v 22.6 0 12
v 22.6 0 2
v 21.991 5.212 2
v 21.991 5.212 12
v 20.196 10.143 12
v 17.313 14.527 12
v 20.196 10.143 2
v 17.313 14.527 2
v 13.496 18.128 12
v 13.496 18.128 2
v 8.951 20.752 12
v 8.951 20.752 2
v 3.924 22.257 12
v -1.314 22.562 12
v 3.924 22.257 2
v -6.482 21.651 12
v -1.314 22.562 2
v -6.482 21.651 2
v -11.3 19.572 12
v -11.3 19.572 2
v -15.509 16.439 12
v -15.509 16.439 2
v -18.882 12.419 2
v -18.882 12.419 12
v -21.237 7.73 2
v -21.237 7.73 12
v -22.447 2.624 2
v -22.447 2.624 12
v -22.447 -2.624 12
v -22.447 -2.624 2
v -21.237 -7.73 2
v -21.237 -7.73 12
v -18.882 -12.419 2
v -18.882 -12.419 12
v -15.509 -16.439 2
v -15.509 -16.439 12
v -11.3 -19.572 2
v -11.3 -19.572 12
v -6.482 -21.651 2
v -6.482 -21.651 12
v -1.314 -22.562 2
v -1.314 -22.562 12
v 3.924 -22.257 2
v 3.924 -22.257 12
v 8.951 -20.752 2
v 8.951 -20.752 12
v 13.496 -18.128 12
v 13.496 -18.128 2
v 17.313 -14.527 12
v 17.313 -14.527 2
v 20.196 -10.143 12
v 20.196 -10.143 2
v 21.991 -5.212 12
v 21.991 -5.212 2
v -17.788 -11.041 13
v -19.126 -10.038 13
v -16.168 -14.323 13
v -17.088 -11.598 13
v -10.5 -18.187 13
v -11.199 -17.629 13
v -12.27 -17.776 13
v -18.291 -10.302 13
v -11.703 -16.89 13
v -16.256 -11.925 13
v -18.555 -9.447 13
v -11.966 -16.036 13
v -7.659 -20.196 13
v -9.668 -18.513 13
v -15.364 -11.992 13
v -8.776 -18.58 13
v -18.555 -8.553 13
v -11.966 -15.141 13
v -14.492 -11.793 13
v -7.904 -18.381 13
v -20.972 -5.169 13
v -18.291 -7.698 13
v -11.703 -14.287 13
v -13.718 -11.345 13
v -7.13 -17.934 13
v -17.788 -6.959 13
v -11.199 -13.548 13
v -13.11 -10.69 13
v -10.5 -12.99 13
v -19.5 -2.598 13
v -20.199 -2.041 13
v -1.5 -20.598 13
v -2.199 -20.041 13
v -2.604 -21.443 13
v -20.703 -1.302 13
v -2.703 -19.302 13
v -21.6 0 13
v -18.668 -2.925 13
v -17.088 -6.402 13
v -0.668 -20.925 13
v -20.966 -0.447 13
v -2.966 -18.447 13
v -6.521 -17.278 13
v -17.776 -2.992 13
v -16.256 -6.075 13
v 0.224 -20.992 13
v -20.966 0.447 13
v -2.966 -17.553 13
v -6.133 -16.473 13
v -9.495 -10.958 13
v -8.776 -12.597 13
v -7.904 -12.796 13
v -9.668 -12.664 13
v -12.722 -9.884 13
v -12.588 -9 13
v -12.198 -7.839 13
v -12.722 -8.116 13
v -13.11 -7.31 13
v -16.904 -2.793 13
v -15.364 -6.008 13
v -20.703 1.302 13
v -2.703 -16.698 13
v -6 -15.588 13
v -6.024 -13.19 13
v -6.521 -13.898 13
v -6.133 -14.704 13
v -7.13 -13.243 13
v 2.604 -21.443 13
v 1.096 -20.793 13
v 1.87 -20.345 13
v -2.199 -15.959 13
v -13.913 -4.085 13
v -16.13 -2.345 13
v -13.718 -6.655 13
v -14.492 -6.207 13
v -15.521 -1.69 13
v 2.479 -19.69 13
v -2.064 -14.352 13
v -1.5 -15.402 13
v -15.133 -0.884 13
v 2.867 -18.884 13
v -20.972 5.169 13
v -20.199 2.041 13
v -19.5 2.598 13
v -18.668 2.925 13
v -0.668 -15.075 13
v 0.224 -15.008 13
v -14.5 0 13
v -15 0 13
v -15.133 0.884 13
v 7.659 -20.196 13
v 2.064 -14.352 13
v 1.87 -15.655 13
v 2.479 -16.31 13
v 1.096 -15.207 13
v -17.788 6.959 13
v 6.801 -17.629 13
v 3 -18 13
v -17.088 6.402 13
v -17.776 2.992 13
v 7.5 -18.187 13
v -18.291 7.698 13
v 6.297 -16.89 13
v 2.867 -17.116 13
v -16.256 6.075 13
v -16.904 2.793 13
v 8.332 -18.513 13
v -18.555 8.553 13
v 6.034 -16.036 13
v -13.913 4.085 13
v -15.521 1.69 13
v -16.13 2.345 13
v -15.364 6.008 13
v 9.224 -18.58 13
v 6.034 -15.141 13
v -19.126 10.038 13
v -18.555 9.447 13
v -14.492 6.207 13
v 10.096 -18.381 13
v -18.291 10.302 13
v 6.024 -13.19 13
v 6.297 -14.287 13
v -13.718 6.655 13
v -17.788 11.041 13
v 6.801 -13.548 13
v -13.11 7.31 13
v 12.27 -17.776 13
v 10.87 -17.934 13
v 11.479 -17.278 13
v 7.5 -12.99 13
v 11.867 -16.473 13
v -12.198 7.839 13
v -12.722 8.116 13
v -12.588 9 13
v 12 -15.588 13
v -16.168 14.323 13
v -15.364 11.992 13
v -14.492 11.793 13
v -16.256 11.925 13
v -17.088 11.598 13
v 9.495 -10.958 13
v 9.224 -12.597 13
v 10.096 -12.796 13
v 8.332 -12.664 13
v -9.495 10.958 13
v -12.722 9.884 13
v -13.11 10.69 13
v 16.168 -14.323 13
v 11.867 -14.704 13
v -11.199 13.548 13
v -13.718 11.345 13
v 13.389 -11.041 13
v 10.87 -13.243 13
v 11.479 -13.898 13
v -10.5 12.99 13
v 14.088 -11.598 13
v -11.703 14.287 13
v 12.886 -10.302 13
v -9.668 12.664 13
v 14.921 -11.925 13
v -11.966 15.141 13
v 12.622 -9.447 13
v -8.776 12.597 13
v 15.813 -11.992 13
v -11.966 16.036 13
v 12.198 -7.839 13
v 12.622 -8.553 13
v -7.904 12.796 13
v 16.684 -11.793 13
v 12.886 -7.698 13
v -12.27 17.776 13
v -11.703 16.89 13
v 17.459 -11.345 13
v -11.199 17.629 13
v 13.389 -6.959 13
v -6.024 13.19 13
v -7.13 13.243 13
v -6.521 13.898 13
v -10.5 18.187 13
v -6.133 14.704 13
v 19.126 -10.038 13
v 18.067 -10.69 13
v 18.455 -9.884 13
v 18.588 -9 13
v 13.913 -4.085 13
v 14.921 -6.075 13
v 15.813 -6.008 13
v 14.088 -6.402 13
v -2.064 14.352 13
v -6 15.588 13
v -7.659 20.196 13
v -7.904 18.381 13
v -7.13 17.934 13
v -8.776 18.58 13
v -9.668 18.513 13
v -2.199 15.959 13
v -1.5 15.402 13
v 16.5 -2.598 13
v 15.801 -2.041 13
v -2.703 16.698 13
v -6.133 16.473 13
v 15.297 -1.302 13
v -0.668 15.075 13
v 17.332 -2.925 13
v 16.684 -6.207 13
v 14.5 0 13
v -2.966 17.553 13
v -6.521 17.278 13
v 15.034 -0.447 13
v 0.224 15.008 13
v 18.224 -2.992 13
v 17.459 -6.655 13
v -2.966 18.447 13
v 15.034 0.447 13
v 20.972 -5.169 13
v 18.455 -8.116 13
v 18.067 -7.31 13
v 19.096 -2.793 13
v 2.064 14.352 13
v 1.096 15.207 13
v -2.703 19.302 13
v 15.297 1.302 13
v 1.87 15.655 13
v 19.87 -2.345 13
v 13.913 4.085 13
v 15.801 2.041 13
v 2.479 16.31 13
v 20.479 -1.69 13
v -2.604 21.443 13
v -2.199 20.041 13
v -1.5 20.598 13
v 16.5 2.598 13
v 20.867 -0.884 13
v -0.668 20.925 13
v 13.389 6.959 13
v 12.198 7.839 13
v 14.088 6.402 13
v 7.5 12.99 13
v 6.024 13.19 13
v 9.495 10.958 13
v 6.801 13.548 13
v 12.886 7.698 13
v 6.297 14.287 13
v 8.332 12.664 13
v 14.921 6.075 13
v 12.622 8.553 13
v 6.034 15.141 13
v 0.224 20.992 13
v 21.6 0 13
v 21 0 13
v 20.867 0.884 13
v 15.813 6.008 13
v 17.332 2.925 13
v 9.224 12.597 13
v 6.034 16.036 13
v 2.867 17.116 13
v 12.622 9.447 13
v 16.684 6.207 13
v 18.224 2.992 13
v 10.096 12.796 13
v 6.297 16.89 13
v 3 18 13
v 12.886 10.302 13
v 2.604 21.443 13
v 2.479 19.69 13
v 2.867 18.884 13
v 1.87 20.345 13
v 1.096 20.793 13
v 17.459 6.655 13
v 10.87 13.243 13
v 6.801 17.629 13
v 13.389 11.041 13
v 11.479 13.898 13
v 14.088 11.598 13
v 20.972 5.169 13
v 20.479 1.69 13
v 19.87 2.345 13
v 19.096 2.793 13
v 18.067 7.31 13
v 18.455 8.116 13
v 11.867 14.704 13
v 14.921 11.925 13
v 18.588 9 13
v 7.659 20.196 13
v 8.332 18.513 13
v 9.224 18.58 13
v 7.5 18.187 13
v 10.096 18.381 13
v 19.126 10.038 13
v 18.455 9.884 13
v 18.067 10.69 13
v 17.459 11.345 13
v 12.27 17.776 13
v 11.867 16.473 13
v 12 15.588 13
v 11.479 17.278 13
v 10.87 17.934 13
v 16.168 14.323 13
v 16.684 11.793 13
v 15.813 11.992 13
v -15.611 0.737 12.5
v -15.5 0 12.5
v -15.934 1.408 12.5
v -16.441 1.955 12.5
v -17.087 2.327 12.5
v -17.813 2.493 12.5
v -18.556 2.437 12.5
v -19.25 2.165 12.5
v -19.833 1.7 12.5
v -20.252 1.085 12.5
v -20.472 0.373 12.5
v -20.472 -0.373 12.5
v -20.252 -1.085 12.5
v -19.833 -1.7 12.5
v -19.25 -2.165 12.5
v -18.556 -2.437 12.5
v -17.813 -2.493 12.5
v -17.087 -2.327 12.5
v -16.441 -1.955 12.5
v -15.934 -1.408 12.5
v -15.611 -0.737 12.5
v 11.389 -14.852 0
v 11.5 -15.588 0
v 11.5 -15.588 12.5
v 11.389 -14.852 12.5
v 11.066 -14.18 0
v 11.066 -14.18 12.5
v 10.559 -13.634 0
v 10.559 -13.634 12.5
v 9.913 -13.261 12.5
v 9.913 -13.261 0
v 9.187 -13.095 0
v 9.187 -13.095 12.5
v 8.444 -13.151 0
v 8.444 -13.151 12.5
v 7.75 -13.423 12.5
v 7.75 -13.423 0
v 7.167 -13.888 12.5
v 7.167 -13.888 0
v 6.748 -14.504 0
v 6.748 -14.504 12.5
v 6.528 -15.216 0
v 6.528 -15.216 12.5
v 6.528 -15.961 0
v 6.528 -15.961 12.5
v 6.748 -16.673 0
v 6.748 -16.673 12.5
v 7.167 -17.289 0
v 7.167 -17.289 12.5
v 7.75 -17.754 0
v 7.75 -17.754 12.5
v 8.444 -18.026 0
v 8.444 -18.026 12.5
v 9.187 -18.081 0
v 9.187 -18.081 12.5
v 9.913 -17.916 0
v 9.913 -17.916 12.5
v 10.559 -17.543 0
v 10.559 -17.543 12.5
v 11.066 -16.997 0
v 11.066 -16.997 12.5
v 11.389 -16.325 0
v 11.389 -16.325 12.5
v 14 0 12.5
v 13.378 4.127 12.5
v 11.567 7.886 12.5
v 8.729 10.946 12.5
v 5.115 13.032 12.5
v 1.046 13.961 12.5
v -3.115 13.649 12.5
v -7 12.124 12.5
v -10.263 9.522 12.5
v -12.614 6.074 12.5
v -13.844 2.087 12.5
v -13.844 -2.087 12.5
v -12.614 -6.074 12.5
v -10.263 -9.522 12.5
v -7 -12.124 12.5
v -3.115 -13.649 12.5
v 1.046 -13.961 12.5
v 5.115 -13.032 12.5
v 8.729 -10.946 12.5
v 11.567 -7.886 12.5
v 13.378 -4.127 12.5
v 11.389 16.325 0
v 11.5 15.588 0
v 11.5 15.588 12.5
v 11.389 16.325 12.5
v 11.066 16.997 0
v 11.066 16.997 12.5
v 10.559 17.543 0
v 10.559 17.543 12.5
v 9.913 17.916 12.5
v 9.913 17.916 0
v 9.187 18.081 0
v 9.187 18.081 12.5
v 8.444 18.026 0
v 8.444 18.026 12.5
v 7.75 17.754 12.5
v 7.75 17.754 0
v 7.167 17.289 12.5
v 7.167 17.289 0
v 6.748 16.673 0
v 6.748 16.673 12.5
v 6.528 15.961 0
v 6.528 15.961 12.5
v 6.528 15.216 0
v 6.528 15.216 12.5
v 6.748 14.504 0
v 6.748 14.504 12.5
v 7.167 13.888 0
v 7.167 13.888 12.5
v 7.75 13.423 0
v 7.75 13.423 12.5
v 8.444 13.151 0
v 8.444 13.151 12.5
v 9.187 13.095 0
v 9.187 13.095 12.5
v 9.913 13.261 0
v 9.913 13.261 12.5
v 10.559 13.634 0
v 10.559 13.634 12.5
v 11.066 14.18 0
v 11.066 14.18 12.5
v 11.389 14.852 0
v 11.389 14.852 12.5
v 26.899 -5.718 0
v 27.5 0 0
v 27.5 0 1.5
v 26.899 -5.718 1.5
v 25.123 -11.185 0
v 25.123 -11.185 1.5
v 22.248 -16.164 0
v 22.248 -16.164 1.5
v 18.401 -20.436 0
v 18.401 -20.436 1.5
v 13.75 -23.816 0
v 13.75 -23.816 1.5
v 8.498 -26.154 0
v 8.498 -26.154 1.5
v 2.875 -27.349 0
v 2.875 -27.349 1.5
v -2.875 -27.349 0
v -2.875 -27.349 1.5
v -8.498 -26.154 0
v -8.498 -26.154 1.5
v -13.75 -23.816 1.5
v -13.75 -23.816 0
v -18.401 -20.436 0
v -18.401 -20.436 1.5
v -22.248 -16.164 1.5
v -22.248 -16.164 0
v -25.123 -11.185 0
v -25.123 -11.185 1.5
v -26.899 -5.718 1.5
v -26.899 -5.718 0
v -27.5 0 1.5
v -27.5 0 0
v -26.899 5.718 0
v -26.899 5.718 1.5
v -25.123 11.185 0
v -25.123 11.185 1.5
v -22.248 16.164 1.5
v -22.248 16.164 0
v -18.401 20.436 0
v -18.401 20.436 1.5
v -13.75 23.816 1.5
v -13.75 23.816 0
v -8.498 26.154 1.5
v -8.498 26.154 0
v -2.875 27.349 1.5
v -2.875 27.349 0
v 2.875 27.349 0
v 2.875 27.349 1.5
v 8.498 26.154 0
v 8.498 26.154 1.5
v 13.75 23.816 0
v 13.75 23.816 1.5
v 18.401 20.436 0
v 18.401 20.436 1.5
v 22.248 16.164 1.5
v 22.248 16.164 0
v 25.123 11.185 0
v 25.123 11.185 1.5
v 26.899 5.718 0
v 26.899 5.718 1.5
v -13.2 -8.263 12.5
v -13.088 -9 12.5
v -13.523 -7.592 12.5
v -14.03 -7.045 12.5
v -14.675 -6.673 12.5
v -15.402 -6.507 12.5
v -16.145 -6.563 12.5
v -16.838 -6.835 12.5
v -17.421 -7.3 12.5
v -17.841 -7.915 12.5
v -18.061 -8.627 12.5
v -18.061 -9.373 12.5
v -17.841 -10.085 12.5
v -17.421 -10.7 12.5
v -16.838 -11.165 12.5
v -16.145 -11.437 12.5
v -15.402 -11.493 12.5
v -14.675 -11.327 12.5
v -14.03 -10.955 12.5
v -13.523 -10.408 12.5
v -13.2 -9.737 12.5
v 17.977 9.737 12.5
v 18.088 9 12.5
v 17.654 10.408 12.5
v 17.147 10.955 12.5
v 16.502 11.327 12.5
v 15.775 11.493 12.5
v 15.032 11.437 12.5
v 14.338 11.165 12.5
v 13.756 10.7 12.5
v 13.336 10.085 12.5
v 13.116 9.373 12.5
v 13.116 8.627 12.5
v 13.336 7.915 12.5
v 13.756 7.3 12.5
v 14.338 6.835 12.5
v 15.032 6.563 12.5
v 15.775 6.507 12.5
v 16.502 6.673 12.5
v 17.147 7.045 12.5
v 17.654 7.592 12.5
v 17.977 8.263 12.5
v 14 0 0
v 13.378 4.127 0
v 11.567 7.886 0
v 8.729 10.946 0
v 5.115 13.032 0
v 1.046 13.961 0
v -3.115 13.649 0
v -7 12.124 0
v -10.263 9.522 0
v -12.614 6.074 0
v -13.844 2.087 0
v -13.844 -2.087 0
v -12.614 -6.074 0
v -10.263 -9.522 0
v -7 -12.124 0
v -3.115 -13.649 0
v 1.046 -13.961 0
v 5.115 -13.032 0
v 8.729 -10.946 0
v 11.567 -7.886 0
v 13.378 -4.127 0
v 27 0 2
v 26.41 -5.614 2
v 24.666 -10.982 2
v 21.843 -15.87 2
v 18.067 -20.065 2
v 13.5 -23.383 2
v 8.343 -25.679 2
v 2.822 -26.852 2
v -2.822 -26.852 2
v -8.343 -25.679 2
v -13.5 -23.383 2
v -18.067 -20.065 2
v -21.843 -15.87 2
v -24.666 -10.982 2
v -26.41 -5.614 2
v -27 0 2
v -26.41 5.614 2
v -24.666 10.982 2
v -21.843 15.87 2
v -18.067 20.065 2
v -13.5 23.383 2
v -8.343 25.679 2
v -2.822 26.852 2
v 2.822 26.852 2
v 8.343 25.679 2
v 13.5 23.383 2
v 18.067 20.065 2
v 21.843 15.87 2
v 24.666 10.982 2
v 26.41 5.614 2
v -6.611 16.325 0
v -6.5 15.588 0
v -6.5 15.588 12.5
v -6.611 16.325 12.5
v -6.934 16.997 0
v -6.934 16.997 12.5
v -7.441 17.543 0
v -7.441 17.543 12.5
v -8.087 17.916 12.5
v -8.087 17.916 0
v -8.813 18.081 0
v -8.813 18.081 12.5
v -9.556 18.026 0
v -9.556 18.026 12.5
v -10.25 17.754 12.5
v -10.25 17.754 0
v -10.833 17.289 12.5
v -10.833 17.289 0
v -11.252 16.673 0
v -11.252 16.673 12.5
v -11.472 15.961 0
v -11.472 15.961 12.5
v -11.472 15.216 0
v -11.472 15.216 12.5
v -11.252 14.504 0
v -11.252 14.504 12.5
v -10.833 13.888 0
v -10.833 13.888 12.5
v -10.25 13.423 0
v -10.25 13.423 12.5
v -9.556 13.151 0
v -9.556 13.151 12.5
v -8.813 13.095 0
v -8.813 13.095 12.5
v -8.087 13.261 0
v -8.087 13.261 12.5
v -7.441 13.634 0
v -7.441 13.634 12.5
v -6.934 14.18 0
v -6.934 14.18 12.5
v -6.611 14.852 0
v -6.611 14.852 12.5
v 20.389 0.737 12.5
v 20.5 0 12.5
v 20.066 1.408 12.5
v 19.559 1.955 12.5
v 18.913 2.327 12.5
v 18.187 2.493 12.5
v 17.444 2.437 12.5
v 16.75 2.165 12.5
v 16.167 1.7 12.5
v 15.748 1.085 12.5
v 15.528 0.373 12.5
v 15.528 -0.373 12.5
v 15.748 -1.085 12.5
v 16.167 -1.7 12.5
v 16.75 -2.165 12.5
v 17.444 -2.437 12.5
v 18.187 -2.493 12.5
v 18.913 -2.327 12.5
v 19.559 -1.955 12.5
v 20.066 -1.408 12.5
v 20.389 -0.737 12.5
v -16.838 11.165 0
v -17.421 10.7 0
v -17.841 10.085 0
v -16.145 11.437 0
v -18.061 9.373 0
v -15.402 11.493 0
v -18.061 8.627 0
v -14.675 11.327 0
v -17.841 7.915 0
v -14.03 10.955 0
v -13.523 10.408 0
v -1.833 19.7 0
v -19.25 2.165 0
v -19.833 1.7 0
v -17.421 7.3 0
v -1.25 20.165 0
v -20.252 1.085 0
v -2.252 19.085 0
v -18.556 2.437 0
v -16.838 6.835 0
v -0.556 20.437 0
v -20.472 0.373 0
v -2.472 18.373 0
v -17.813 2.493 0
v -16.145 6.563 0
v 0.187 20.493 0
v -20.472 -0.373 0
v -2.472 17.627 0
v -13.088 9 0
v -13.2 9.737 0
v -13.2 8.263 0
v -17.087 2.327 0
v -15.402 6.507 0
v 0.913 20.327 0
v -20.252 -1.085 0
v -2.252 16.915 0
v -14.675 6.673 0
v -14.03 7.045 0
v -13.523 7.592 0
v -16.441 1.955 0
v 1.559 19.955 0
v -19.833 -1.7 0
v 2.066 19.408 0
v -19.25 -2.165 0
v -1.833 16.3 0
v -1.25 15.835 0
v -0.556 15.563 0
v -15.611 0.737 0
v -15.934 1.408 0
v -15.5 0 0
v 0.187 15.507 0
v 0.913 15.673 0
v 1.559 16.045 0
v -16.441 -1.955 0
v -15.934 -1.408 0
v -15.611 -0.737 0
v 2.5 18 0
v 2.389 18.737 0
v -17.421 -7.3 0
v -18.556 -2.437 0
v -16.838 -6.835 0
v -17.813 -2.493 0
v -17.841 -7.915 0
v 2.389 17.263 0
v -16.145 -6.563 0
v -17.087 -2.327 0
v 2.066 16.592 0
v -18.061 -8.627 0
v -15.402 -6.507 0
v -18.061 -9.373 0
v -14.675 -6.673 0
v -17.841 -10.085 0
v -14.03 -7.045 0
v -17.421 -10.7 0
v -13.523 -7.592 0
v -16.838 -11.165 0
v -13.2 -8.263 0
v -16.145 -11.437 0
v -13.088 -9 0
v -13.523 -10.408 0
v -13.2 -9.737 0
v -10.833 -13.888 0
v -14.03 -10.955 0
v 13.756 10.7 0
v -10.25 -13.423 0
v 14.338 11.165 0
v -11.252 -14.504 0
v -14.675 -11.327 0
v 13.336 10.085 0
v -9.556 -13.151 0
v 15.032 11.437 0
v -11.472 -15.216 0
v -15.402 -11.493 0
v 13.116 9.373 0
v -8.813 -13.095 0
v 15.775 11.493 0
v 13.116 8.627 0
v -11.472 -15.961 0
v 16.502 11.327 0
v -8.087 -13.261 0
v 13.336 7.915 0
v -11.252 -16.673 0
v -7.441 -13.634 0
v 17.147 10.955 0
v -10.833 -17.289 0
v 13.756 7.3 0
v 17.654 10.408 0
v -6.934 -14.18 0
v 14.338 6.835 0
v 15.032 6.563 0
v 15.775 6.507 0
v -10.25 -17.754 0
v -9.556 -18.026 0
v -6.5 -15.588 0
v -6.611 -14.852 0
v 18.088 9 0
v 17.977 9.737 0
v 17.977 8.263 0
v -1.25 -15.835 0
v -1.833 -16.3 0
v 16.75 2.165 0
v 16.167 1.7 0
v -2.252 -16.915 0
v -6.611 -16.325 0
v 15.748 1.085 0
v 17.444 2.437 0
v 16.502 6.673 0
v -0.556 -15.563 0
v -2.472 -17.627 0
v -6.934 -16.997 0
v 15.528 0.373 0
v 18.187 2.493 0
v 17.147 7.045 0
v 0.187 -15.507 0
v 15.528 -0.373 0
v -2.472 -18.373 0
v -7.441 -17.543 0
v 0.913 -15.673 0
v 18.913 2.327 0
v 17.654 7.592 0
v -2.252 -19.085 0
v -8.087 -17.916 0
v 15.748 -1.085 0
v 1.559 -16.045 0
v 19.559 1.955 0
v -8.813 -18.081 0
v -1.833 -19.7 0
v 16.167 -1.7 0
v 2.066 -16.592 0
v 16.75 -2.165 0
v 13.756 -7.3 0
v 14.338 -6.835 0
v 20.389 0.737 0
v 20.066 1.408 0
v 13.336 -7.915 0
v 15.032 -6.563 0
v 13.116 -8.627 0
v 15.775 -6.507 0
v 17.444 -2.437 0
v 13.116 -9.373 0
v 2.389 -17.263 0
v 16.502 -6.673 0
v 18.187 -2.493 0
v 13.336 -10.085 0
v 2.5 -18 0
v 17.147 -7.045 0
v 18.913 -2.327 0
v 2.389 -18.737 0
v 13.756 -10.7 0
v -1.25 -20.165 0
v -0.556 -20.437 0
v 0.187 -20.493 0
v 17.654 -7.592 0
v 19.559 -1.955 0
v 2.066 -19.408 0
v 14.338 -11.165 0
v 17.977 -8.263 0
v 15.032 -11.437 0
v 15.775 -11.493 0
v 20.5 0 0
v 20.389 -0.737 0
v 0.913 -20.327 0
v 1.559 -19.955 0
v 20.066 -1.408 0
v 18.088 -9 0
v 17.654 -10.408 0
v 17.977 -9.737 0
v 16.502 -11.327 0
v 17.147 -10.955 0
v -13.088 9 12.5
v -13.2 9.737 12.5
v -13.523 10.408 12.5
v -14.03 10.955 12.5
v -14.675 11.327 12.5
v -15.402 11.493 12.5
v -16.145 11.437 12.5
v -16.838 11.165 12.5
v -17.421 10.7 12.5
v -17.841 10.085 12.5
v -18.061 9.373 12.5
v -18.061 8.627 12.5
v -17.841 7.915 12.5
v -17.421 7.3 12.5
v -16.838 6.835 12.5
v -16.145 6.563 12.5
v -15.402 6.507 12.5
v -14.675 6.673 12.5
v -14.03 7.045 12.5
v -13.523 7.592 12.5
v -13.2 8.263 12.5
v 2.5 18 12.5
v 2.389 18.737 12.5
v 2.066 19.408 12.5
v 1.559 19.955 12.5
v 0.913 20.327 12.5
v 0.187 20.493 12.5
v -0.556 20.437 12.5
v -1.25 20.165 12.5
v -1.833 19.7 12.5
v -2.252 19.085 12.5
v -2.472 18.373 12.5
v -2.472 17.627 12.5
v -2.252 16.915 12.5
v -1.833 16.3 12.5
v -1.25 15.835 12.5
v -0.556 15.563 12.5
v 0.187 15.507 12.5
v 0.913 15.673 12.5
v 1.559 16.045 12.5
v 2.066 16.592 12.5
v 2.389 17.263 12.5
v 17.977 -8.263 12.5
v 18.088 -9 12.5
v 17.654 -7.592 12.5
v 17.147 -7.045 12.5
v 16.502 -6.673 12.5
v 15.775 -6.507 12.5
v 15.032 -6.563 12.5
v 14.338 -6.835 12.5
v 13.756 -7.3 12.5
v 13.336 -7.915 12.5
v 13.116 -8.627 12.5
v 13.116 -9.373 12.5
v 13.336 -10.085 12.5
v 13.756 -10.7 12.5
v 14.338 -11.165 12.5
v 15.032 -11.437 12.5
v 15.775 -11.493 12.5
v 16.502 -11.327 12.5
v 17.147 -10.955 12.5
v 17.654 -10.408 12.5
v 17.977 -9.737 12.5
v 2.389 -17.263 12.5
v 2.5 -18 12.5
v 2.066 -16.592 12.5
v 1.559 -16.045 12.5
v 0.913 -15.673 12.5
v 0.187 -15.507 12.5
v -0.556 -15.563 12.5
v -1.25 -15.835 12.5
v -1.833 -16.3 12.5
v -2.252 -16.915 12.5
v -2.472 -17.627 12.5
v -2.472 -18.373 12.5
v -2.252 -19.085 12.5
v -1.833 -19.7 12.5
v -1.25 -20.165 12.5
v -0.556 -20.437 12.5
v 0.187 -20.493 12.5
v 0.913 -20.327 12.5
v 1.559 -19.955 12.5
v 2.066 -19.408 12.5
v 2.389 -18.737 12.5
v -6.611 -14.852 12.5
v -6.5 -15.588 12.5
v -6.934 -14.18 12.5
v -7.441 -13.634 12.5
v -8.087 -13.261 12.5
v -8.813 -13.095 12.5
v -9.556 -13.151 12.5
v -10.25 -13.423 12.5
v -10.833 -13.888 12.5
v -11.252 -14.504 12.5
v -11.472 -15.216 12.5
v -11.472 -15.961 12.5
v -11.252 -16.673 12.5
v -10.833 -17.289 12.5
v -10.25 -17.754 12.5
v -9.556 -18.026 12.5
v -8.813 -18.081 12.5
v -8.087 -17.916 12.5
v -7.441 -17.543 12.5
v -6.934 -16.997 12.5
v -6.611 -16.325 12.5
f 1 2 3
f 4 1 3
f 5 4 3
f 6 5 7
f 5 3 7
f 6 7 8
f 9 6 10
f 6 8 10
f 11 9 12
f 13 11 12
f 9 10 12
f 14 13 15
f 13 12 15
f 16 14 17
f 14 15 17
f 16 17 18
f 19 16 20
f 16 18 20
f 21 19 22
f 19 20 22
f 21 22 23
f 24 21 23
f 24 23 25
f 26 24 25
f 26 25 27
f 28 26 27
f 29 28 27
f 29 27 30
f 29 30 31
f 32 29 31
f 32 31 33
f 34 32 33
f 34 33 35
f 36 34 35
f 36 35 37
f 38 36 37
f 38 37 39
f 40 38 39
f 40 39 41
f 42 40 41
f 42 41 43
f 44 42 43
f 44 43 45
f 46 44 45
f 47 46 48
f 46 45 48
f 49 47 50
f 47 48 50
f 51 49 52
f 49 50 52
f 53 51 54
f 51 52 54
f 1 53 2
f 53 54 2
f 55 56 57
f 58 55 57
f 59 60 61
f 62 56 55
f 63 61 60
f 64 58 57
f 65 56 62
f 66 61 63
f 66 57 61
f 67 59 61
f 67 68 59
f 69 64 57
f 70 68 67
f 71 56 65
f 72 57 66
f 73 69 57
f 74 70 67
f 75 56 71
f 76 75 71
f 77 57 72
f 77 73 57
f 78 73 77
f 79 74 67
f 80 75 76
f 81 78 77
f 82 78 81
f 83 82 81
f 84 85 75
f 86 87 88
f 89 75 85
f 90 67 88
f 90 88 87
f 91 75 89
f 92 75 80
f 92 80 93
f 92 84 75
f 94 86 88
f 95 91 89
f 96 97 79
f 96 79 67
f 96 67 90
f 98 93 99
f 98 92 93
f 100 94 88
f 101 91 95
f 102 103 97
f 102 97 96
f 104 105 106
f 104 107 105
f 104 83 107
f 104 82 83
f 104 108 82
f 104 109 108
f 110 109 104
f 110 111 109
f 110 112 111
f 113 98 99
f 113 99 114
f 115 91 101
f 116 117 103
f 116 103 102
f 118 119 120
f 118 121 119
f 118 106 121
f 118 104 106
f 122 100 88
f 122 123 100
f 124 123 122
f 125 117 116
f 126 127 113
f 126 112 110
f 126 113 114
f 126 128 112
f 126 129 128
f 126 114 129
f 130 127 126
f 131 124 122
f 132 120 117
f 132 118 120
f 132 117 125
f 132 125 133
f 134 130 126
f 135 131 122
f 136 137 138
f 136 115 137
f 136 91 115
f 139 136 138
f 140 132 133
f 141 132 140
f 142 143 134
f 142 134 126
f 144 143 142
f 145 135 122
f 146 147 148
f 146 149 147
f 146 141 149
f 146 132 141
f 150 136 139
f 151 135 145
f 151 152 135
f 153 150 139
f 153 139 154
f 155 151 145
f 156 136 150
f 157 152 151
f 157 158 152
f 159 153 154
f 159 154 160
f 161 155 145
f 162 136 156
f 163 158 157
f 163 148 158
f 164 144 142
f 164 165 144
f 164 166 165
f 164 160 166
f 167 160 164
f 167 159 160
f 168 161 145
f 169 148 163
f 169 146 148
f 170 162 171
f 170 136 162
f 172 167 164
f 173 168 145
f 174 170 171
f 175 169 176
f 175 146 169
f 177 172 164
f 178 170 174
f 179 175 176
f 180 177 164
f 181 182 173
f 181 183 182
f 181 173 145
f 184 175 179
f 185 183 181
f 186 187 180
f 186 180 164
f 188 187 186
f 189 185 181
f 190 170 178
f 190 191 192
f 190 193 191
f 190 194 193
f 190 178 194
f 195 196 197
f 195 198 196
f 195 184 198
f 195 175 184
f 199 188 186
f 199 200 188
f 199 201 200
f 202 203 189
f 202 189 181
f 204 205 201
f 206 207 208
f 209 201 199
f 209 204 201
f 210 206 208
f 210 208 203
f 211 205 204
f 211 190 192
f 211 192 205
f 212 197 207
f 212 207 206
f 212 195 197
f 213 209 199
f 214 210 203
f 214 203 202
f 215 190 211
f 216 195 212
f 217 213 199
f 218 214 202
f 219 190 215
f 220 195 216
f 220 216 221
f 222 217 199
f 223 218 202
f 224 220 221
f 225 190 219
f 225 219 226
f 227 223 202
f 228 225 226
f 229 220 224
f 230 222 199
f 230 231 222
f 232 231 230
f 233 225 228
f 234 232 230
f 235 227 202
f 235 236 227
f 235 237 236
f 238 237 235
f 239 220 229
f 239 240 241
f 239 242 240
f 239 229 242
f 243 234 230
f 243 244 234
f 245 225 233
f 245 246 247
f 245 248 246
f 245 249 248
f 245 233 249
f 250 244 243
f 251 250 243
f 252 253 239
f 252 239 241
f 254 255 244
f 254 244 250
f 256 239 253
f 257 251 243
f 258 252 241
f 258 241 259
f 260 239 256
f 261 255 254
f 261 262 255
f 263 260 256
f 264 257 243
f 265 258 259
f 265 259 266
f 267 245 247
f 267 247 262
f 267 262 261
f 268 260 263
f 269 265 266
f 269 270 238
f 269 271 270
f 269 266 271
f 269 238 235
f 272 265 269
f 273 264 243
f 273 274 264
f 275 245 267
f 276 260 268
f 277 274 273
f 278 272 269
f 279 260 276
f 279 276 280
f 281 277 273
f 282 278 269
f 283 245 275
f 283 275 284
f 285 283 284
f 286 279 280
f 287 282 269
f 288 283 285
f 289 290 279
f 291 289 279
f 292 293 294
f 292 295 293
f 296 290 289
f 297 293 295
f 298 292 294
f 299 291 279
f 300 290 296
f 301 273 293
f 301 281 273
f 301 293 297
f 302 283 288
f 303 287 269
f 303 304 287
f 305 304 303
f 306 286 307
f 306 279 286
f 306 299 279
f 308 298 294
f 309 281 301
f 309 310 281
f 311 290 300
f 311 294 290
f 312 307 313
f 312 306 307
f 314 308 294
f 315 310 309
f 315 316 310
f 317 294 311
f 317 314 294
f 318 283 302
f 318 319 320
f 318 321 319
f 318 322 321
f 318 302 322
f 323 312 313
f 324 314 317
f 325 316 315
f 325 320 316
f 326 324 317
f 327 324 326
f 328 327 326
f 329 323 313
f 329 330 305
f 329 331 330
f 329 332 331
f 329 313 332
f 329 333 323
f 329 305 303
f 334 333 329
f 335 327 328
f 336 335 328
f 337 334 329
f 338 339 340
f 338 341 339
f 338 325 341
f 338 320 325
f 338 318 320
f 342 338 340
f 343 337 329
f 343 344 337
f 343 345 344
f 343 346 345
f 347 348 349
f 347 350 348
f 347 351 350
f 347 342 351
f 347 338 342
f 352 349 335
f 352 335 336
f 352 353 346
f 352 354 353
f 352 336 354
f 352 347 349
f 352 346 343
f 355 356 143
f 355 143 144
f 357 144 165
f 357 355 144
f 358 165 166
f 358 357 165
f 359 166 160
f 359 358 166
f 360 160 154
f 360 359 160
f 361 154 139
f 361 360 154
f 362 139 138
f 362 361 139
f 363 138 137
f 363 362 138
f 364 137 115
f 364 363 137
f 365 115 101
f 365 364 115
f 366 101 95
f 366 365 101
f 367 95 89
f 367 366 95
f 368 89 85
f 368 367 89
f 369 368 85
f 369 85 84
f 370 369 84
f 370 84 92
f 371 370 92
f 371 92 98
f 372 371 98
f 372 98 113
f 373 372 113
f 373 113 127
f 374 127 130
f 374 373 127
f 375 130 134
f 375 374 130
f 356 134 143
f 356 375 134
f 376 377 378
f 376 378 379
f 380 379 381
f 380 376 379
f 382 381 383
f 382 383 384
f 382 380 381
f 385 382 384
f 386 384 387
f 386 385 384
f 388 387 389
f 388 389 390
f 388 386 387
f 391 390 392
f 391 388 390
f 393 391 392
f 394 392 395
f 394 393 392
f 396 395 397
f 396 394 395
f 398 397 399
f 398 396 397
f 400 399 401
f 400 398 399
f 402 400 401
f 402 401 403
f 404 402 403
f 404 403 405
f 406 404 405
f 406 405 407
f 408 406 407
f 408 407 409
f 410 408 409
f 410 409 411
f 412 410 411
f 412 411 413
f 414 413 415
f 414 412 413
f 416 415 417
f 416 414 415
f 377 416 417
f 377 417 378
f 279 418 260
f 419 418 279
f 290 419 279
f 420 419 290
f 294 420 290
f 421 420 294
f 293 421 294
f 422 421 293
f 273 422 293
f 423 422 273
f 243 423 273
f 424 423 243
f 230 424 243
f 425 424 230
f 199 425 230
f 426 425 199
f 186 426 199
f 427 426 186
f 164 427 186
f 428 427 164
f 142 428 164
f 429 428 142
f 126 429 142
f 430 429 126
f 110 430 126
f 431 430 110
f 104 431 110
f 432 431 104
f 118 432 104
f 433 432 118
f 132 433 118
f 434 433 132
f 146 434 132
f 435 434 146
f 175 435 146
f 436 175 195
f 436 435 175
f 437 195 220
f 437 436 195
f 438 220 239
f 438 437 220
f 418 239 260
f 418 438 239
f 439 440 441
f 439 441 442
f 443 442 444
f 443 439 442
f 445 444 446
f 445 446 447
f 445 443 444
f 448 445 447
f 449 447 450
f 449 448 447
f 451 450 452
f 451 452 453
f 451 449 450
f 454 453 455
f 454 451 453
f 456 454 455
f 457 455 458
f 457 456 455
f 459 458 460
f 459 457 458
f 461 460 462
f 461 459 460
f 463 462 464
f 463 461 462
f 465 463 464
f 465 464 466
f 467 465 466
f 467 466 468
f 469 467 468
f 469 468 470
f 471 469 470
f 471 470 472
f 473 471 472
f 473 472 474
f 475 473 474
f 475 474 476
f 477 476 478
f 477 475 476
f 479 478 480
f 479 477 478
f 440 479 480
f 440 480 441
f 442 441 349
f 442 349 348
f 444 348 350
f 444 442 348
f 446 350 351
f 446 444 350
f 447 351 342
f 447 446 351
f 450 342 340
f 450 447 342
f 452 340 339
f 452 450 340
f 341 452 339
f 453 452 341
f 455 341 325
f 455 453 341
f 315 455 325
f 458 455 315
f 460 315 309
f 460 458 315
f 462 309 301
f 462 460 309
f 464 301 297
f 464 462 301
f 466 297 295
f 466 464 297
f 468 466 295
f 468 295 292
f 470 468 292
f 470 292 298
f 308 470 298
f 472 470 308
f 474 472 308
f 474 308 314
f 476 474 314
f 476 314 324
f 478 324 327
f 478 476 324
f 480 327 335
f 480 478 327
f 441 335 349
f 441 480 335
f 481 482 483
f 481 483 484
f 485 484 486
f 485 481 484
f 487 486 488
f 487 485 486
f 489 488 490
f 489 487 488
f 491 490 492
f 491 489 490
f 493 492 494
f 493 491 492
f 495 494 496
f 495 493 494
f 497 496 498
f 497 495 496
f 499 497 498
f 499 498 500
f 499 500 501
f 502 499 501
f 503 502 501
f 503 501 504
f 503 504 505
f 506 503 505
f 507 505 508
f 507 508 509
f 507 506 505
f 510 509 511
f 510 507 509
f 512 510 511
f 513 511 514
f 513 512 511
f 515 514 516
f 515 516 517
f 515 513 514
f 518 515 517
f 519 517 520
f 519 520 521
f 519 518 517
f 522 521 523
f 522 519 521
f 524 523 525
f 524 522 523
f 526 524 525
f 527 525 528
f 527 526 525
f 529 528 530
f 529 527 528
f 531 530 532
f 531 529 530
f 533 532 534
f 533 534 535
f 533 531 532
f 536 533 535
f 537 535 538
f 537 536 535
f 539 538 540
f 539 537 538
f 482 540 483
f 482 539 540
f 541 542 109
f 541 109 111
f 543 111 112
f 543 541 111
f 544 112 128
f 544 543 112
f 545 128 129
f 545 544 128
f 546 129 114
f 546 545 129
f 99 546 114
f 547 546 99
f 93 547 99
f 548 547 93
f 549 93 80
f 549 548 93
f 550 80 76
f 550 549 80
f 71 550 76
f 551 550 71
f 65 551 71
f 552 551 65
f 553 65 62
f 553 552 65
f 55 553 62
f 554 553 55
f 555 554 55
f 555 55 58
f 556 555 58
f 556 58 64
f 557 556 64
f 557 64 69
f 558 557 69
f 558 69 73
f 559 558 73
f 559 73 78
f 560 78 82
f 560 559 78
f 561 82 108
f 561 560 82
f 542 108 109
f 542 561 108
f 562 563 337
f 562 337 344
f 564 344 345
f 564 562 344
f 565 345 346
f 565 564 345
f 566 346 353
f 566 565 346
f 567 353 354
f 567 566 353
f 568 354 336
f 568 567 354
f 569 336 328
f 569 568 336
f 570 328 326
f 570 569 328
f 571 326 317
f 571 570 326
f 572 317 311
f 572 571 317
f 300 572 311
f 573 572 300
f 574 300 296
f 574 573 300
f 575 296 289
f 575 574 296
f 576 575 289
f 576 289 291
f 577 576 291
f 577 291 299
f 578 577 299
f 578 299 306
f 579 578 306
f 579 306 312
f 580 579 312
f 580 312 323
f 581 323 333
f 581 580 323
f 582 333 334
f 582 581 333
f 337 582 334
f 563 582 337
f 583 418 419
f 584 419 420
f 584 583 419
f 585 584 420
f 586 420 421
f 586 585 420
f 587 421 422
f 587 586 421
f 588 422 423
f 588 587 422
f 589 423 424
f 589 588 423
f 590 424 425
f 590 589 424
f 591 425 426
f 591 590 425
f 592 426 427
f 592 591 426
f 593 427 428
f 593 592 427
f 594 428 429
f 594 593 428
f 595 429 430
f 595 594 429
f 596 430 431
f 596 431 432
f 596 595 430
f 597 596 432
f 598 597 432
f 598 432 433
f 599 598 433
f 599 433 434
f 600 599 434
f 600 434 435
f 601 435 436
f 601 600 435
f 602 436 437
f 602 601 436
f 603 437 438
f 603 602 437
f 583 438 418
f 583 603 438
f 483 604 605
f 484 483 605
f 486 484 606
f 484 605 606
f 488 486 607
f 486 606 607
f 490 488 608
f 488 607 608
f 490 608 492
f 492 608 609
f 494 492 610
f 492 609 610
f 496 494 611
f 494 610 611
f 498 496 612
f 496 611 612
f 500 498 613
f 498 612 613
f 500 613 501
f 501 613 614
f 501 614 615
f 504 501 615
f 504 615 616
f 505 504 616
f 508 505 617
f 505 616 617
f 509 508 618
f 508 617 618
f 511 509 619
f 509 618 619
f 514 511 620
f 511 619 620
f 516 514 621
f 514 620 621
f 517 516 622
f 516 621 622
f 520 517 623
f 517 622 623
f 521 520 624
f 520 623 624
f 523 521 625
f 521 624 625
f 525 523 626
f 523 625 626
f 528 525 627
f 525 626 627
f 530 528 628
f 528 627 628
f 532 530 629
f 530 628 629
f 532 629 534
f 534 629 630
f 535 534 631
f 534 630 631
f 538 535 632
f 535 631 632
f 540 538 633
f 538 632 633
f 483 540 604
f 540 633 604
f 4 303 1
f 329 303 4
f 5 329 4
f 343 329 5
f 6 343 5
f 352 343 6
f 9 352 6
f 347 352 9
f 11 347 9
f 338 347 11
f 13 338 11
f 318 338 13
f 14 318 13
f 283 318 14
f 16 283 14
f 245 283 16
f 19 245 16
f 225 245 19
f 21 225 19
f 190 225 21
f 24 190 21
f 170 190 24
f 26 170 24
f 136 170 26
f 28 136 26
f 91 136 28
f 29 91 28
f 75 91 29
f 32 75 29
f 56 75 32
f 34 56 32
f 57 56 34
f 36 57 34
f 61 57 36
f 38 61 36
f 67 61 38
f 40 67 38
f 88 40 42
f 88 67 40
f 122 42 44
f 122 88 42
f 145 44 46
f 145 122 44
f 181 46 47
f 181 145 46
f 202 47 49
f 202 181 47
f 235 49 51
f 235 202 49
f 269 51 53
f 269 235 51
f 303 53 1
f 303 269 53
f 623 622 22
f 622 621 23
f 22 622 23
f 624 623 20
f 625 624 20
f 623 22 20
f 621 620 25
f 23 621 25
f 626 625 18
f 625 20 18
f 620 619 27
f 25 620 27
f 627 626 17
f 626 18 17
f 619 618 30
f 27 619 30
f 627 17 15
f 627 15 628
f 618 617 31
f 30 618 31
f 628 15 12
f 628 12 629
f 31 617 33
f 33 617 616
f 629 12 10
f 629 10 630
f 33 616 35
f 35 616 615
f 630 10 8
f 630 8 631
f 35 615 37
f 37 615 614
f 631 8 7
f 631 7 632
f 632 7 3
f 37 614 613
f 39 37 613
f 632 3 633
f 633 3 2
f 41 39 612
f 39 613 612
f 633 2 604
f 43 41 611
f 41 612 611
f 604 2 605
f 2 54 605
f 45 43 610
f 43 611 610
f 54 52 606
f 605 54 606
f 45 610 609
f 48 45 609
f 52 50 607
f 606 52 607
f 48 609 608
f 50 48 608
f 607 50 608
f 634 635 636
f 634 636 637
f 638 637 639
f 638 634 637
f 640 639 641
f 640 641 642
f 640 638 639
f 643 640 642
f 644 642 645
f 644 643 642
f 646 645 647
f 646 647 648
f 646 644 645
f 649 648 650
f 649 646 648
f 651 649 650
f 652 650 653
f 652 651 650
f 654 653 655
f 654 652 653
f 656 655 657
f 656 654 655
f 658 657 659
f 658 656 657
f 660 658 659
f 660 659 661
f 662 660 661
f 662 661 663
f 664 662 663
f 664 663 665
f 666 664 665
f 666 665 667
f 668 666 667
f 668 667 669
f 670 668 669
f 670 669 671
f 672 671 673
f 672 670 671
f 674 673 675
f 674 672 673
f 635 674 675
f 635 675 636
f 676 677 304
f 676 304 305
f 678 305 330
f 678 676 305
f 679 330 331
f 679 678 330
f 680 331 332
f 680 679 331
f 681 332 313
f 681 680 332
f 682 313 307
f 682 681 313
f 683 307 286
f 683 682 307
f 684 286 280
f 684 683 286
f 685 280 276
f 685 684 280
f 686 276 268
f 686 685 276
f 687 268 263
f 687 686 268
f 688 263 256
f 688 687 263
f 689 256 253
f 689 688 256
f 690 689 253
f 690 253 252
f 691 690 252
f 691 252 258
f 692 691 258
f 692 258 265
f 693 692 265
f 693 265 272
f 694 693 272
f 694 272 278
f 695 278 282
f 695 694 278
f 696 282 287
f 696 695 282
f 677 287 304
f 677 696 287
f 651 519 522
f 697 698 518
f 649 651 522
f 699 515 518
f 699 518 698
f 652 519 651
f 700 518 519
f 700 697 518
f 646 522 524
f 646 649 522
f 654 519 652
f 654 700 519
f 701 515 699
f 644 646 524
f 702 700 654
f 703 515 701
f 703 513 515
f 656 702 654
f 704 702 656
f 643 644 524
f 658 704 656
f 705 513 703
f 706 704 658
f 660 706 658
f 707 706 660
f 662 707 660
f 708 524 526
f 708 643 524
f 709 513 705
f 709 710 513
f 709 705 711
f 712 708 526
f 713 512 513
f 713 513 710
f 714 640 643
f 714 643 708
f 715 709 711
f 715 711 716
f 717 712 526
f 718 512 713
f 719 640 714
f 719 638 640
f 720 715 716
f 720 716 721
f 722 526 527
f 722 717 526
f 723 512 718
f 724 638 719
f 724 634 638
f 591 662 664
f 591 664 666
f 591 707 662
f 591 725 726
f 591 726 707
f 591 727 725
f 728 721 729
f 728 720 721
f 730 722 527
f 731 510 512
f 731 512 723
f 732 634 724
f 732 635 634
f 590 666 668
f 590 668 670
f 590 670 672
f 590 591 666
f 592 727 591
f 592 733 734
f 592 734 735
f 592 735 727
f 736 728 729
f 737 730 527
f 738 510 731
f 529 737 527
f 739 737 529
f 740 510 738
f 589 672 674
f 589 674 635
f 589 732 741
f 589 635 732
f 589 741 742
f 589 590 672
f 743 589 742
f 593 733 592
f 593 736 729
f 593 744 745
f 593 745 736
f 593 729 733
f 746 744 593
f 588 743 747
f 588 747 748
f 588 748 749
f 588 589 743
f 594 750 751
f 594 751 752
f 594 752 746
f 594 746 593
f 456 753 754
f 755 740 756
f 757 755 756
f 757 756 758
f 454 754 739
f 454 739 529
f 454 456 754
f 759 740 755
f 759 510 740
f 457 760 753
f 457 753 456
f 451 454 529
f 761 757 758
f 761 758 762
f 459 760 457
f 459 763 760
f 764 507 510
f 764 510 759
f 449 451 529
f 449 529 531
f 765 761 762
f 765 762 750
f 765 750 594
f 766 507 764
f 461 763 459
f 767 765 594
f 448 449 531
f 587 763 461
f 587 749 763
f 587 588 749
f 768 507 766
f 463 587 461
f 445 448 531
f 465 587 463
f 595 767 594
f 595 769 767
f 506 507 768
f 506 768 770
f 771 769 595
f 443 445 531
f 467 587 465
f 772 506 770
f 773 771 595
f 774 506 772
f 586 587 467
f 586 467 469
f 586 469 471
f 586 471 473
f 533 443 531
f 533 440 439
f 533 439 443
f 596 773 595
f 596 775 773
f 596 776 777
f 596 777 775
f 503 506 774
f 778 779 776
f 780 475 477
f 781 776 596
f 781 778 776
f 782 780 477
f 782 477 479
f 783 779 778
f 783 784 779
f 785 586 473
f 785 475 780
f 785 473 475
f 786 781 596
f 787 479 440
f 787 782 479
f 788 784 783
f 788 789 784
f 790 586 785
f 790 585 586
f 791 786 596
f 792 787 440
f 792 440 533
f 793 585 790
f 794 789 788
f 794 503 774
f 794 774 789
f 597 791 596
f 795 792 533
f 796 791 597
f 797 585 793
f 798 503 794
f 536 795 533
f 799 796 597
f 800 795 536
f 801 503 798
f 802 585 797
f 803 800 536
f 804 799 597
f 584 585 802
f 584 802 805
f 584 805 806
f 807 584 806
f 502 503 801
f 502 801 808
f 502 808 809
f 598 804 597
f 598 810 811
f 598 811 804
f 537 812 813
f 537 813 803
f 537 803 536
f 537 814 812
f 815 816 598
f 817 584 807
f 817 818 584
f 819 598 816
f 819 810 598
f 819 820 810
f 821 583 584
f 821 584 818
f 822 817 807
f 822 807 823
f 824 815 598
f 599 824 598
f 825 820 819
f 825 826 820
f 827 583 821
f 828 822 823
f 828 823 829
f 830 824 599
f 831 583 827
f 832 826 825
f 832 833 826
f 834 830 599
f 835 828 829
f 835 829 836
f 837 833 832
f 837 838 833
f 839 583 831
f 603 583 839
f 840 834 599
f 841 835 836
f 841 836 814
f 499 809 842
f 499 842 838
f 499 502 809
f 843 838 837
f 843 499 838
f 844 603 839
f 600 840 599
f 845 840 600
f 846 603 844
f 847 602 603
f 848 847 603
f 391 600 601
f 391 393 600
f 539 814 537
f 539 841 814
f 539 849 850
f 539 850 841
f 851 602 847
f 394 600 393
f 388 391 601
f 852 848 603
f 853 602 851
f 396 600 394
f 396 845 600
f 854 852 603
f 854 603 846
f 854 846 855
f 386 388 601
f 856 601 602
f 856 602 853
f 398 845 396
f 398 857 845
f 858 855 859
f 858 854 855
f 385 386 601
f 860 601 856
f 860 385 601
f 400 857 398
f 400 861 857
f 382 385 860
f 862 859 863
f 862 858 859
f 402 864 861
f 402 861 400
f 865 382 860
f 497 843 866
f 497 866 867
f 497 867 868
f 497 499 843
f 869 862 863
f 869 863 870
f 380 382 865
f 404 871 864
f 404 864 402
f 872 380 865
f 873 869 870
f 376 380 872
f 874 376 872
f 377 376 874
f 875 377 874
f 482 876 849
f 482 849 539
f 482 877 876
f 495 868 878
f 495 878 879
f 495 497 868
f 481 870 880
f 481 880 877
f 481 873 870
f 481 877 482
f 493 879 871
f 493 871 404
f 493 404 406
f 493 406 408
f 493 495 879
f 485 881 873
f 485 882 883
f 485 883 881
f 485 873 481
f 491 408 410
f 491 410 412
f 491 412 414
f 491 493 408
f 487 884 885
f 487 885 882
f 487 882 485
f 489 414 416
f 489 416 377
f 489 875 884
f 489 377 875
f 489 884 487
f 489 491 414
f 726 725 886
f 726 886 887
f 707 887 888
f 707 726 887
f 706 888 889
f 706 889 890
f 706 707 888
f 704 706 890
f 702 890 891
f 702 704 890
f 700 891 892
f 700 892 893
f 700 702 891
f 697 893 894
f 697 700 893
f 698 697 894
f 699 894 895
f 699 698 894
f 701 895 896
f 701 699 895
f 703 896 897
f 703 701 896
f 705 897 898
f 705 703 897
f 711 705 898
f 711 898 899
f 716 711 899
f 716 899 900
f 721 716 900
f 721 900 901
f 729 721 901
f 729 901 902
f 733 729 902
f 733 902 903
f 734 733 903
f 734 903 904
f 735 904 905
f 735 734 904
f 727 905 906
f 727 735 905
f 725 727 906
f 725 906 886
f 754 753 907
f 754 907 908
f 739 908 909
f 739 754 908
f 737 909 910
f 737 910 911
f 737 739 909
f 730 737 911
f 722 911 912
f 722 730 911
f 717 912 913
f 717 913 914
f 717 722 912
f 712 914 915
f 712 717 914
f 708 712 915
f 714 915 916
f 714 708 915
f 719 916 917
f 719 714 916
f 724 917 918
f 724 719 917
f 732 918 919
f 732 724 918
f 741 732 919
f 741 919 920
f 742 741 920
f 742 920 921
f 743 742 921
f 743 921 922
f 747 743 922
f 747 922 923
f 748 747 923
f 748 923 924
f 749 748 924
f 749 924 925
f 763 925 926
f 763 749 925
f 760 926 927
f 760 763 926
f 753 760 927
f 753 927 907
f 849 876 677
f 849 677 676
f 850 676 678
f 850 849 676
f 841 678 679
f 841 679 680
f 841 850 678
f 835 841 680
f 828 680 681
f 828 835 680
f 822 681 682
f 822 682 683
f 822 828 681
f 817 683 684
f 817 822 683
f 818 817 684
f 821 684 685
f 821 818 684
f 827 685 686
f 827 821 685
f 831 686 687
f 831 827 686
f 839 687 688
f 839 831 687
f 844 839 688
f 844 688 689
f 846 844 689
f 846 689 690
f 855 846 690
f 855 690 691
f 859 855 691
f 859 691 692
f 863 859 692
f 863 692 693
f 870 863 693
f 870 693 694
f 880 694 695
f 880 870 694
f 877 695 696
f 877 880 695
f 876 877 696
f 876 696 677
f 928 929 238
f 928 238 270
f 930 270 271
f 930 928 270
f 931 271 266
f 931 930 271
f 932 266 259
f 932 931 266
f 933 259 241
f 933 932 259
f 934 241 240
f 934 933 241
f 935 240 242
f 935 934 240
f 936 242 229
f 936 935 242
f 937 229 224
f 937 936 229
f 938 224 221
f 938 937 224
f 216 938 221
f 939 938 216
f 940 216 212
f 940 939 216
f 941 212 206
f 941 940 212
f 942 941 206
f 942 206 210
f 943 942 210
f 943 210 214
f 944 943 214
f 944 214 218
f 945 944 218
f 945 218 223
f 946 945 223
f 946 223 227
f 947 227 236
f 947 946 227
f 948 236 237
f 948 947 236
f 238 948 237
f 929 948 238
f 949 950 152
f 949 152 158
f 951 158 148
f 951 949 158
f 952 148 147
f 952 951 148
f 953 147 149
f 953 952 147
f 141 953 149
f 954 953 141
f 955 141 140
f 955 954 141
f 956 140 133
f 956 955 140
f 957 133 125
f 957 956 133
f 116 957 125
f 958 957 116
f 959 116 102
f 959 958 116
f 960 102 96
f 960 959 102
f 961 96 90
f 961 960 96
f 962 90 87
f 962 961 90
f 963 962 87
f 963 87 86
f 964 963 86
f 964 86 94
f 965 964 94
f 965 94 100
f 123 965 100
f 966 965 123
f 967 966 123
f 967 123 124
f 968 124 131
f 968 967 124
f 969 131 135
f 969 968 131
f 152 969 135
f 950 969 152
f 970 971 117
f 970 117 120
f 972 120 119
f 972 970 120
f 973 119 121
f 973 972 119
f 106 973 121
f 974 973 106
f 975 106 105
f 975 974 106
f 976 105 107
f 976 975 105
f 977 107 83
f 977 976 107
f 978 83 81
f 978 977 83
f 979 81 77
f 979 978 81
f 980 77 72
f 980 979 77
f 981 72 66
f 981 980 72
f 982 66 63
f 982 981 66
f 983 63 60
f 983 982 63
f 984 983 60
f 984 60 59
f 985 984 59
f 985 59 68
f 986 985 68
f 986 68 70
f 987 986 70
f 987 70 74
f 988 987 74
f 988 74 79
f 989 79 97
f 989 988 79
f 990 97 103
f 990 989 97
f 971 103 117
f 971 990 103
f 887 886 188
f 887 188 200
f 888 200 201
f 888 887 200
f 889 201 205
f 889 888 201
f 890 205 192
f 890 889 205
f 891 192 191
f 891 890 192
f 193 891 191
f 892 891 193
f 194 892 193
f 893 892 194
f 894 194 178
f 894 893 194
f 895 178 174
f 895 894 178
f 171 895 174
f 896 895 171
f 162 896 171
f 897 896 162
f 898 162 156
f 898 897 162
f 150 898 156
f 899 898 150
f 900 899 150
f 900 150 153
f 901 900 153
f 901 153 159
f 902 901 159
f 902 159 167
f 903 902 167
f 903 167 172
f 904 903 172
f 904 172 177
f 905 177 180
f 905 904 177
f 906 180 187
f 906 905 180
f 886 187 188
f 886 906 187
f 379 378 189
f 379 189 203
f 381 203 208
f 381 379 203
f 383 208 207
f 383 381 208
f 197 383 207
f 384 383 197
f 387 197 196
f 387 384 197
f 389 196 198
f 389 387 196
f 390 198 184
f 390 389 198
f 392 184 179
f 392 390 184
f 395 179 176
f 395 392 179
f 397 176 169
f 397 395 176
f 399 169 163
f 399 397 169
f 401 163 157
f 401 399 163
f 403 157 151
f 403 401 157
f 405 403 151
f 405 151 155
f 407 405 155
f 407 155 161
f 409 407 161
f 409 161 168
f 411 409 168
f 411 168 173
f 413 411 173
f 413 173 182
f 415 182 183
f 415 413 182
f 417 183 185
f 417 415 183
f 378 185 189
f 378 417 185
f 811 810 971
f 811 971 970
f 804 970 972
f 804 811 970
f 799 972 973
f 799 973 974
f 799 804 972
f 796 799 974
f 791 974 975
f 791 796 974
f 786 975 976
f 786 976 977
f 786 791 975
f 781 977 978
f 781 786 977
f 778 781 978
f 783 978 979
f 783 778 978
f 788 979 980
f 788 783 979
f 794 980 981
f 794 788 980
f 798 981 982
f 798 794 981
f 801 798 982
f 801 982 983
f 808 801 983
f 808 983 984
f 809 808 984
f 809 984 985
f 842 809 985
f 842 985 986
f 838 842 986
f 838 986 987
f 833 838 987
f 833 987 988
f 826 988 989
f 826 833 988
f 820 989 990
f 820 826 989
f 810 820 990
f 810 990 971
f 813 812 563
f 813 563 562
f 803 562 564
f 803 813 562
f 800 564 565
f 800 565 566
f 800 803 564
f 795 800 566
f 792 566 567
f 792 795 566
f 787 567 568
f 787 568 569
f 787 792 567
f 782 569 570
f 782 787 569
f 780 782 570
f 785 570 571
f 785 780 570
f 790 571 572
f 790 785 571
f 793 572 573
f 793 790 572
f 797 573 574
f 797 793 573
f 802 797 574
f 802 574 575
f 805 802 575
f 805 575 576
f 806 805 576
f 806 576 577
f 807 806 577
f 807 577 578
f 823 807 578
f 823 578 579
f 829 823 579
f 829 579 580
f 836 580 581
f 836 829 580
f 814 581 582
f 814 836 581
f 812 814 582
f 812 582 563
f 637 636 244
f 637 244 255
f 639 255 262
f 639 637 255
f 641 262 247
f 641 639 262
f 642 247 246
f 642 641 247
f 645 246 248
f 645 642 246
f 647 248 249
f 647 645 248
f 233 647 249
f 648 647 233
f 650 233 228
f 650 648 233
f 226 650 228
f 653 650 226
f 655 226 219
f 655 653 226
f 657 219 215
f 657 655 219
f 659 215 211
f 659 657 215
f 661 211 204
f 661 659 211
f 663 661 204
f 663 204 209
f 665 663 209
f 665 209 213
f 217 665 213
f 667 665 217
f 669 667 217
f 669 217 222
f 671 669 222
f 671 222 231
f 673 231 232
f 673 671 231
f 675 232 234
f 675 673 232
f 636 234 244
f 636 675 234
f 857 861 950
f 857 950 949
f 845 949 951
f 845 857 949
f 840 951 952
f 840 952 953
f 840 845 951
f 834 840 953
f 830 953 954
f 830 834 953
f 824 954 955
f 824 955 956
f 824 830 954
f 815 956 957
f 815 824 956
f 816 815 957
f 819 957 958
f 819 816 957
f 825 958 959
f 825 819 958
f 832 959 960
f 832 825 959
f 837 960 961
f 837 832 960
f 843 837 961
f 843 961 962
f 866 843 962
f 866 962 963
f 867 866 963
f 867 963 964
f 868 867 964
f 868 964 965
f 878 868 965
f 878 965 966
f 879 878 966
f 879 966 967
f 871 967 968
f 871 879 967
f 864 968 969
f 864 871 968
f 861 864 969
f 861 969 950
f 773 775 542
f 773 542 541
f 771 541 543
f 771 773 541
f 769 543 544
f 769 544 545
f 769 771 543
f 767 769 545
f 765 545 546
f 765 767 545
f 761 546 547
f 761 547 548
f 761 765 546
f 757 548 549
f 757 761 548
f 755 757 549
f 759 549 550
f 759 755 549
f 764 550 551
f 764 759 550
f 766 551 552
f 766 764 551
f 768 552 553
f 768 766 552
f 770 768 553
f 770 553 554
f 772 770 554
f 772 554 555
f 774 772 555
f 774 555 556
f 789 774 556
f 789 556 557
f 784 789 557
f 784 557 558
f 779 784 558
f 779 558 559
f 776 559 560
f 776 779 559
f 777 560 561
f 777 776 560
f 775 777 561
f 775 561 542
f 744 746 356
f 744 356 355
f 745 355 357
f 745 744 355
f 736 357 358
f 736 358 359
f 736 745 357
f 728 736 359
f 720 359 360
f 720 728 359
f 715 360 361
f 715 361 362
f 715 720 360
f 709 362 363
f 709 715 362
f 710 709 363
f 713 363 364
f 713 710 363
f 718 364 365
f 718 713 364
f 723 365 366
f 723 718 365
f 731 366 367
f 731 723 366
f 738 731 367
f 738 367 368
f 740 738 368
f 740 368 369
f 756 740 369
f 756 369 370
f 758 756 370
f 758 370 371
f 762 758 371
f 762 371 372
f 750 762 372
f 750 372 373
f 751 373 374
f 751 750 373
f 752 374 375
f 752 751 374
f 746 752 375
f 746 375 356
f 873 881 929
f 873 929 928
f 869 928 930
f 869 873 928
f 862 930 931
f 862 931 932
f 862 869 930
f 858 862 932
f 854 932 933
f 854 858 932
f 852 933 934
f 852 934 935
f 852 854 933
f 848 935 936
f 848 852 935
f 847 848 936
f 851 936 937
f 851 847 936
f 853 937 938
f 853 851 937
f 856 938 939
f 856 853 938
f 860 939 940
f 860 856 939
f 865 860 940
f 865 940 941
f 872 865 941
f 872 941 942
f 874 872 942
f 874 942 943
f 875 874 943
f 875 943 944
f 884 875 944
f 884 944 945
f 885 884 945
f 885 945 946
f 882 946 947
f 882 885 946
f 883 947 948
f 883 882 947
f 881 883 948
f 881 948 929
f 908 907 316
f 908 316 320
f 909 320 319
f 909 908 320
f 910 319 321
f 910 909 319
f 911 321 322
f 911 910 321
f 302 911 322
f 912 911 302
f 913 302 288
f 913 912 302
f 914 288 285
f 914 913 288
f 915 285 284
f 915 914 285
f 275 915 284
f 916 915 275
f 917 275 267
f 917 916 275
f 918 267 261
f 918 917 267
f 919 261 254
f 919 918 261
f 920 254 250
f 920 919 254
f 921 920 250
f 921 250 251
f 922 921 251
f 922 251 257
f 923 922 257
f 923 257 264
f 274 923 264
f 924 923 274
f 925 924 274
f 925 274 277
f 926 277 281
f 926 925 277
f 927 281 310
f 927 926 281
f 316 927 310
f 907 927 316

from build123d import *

# Parameters (mm, degrees)
SKETCH_R        = 22.6
SKETCH_R_2      = 14
SKETCH_R_3      = 2.5
PAD_DEPTH       = 13
SKETCH001_R     = 27.5
SKETCH001_R_2   = 22.5
PAD001_DEPTH    = 2
CHAMFER_SIZE    = 0.5
CHAMFER001_SIZE = 1
CHAMFER002_SIZE = 0.5
CHAMFER003_SIZE = 0.5


with BuildPart() as part:
    # Sketch → Pad (new body)
    with BuildSketch(Plane.XY):
        Circle(SKETCH_R)
        Circle(SKETCH_R_2, mode=Mode.SUBTRACT)
        with Locations((0, 18)):
            Circle(SKETCH_R_3, mode=Mode.SUBTRACT)
        with Locations((-15.588457, -9)):
            Circle(SKETCH_R_3, mode=Mode.SUBTRACT)
        with Locations((15.588457, -9)):
            Circle(SKETCH_R_3, mode=Mode.SUBTRACT)
        with Locations((0, -18)):
            Circle(SKETCH_R_3, mode=Mode.SUBTRACT)
        with Locations((-15.588457, 9)):
            Circle(SKETCH_R_3, mode=Mode.SUBTRACT)
        with Locations((15.588457, 9)):
            Circle(SKETCH_R_3, mode=Mode.SUBTRACT)
        with Locations((-9, 15.588457)):
            Circle(SKETCH_R_3, mode=Mode.SUBTRACT)
        with Locations((9, -15.588457)):
            Circle(SKETCH_R_3, mode=Mode.SUBTRACT)
        with Locations((9, 15.588457)):
            Circle(SKETCH_R_3, mode=Mode.SUBTRACT)
        with Locations((-9, -15.588457)):
            Circle(SKETCH_R_3, mode=Mode.SUBTRACT)
        with Locations((18, 0)):
            Circle(SKETCH_R_3, mode=Mode.SUBTRACT)
        with Locations((-18, 0)):
            Circle(SKETCH_R_3, mode=Mode.SUBTRACT)
    extrude(amount=PAD_DEPTH)

    # Sketch001 (on Face15 of Pad) → Pad001 (join)
    with BuildSketch(Plane(origin=(0, 0, 0), x_dir=(1, 0, 0), z_dir=(0, 0, -1))):
        Circle(SKETCH001_R)
        Circle(SKETCH001_R_2, mode=Mode.SUBTRACT)
    extrude(amount=-PAD001_DEPTH)

    # Chamfer
    chamfer_edges = [part.edges().sort_by_distance(p)[0] for p in [
        (-27.5, 0, 2),
    ]]
    chamfer(chamfer_edges, length=CHAMFER_SIZE)

    # Chamfer001
    chamfer001_edges = [part.edges().sort_by_distance(p)[0] for p in [
        (-22.6, 0, 13),
    ]]
    chamfer(chamfer001_edges, length=CHAMFER001_SIZE)

    # Chamfer002
    chamfer002_edges = [part.edges().sort_by_distance(p)[0] for p in [
        (13.088457, -9, 13),
        (-11.5, 15.588457, 13),
        (-18.088457, 9, 13),
        (-11.5, -15.588457, 13),
        (6.5, 15.588457, 13),
        (-18.088457, -9, 13),
        (-2.5, 18, 13),
        (-20.5, 0, 13),
        (6.5, -15.588457, 13),
        (15.5, 0, 13),
        (-2.5, -18, 13),
        (13.088457, 9, 13),
    ]]
    chamfer(chamfer002_edges, length=CHAMFER002_SIZE)

    # Chamfer003
    chamfer003_edges = [part.edges().sort_by_distance(p)[0] for p in [
        (-14, 0, 13),
    ]]
    chamfer(chamfer003_edges, length=CHAMFER003_SIZE)


solid = part.part
